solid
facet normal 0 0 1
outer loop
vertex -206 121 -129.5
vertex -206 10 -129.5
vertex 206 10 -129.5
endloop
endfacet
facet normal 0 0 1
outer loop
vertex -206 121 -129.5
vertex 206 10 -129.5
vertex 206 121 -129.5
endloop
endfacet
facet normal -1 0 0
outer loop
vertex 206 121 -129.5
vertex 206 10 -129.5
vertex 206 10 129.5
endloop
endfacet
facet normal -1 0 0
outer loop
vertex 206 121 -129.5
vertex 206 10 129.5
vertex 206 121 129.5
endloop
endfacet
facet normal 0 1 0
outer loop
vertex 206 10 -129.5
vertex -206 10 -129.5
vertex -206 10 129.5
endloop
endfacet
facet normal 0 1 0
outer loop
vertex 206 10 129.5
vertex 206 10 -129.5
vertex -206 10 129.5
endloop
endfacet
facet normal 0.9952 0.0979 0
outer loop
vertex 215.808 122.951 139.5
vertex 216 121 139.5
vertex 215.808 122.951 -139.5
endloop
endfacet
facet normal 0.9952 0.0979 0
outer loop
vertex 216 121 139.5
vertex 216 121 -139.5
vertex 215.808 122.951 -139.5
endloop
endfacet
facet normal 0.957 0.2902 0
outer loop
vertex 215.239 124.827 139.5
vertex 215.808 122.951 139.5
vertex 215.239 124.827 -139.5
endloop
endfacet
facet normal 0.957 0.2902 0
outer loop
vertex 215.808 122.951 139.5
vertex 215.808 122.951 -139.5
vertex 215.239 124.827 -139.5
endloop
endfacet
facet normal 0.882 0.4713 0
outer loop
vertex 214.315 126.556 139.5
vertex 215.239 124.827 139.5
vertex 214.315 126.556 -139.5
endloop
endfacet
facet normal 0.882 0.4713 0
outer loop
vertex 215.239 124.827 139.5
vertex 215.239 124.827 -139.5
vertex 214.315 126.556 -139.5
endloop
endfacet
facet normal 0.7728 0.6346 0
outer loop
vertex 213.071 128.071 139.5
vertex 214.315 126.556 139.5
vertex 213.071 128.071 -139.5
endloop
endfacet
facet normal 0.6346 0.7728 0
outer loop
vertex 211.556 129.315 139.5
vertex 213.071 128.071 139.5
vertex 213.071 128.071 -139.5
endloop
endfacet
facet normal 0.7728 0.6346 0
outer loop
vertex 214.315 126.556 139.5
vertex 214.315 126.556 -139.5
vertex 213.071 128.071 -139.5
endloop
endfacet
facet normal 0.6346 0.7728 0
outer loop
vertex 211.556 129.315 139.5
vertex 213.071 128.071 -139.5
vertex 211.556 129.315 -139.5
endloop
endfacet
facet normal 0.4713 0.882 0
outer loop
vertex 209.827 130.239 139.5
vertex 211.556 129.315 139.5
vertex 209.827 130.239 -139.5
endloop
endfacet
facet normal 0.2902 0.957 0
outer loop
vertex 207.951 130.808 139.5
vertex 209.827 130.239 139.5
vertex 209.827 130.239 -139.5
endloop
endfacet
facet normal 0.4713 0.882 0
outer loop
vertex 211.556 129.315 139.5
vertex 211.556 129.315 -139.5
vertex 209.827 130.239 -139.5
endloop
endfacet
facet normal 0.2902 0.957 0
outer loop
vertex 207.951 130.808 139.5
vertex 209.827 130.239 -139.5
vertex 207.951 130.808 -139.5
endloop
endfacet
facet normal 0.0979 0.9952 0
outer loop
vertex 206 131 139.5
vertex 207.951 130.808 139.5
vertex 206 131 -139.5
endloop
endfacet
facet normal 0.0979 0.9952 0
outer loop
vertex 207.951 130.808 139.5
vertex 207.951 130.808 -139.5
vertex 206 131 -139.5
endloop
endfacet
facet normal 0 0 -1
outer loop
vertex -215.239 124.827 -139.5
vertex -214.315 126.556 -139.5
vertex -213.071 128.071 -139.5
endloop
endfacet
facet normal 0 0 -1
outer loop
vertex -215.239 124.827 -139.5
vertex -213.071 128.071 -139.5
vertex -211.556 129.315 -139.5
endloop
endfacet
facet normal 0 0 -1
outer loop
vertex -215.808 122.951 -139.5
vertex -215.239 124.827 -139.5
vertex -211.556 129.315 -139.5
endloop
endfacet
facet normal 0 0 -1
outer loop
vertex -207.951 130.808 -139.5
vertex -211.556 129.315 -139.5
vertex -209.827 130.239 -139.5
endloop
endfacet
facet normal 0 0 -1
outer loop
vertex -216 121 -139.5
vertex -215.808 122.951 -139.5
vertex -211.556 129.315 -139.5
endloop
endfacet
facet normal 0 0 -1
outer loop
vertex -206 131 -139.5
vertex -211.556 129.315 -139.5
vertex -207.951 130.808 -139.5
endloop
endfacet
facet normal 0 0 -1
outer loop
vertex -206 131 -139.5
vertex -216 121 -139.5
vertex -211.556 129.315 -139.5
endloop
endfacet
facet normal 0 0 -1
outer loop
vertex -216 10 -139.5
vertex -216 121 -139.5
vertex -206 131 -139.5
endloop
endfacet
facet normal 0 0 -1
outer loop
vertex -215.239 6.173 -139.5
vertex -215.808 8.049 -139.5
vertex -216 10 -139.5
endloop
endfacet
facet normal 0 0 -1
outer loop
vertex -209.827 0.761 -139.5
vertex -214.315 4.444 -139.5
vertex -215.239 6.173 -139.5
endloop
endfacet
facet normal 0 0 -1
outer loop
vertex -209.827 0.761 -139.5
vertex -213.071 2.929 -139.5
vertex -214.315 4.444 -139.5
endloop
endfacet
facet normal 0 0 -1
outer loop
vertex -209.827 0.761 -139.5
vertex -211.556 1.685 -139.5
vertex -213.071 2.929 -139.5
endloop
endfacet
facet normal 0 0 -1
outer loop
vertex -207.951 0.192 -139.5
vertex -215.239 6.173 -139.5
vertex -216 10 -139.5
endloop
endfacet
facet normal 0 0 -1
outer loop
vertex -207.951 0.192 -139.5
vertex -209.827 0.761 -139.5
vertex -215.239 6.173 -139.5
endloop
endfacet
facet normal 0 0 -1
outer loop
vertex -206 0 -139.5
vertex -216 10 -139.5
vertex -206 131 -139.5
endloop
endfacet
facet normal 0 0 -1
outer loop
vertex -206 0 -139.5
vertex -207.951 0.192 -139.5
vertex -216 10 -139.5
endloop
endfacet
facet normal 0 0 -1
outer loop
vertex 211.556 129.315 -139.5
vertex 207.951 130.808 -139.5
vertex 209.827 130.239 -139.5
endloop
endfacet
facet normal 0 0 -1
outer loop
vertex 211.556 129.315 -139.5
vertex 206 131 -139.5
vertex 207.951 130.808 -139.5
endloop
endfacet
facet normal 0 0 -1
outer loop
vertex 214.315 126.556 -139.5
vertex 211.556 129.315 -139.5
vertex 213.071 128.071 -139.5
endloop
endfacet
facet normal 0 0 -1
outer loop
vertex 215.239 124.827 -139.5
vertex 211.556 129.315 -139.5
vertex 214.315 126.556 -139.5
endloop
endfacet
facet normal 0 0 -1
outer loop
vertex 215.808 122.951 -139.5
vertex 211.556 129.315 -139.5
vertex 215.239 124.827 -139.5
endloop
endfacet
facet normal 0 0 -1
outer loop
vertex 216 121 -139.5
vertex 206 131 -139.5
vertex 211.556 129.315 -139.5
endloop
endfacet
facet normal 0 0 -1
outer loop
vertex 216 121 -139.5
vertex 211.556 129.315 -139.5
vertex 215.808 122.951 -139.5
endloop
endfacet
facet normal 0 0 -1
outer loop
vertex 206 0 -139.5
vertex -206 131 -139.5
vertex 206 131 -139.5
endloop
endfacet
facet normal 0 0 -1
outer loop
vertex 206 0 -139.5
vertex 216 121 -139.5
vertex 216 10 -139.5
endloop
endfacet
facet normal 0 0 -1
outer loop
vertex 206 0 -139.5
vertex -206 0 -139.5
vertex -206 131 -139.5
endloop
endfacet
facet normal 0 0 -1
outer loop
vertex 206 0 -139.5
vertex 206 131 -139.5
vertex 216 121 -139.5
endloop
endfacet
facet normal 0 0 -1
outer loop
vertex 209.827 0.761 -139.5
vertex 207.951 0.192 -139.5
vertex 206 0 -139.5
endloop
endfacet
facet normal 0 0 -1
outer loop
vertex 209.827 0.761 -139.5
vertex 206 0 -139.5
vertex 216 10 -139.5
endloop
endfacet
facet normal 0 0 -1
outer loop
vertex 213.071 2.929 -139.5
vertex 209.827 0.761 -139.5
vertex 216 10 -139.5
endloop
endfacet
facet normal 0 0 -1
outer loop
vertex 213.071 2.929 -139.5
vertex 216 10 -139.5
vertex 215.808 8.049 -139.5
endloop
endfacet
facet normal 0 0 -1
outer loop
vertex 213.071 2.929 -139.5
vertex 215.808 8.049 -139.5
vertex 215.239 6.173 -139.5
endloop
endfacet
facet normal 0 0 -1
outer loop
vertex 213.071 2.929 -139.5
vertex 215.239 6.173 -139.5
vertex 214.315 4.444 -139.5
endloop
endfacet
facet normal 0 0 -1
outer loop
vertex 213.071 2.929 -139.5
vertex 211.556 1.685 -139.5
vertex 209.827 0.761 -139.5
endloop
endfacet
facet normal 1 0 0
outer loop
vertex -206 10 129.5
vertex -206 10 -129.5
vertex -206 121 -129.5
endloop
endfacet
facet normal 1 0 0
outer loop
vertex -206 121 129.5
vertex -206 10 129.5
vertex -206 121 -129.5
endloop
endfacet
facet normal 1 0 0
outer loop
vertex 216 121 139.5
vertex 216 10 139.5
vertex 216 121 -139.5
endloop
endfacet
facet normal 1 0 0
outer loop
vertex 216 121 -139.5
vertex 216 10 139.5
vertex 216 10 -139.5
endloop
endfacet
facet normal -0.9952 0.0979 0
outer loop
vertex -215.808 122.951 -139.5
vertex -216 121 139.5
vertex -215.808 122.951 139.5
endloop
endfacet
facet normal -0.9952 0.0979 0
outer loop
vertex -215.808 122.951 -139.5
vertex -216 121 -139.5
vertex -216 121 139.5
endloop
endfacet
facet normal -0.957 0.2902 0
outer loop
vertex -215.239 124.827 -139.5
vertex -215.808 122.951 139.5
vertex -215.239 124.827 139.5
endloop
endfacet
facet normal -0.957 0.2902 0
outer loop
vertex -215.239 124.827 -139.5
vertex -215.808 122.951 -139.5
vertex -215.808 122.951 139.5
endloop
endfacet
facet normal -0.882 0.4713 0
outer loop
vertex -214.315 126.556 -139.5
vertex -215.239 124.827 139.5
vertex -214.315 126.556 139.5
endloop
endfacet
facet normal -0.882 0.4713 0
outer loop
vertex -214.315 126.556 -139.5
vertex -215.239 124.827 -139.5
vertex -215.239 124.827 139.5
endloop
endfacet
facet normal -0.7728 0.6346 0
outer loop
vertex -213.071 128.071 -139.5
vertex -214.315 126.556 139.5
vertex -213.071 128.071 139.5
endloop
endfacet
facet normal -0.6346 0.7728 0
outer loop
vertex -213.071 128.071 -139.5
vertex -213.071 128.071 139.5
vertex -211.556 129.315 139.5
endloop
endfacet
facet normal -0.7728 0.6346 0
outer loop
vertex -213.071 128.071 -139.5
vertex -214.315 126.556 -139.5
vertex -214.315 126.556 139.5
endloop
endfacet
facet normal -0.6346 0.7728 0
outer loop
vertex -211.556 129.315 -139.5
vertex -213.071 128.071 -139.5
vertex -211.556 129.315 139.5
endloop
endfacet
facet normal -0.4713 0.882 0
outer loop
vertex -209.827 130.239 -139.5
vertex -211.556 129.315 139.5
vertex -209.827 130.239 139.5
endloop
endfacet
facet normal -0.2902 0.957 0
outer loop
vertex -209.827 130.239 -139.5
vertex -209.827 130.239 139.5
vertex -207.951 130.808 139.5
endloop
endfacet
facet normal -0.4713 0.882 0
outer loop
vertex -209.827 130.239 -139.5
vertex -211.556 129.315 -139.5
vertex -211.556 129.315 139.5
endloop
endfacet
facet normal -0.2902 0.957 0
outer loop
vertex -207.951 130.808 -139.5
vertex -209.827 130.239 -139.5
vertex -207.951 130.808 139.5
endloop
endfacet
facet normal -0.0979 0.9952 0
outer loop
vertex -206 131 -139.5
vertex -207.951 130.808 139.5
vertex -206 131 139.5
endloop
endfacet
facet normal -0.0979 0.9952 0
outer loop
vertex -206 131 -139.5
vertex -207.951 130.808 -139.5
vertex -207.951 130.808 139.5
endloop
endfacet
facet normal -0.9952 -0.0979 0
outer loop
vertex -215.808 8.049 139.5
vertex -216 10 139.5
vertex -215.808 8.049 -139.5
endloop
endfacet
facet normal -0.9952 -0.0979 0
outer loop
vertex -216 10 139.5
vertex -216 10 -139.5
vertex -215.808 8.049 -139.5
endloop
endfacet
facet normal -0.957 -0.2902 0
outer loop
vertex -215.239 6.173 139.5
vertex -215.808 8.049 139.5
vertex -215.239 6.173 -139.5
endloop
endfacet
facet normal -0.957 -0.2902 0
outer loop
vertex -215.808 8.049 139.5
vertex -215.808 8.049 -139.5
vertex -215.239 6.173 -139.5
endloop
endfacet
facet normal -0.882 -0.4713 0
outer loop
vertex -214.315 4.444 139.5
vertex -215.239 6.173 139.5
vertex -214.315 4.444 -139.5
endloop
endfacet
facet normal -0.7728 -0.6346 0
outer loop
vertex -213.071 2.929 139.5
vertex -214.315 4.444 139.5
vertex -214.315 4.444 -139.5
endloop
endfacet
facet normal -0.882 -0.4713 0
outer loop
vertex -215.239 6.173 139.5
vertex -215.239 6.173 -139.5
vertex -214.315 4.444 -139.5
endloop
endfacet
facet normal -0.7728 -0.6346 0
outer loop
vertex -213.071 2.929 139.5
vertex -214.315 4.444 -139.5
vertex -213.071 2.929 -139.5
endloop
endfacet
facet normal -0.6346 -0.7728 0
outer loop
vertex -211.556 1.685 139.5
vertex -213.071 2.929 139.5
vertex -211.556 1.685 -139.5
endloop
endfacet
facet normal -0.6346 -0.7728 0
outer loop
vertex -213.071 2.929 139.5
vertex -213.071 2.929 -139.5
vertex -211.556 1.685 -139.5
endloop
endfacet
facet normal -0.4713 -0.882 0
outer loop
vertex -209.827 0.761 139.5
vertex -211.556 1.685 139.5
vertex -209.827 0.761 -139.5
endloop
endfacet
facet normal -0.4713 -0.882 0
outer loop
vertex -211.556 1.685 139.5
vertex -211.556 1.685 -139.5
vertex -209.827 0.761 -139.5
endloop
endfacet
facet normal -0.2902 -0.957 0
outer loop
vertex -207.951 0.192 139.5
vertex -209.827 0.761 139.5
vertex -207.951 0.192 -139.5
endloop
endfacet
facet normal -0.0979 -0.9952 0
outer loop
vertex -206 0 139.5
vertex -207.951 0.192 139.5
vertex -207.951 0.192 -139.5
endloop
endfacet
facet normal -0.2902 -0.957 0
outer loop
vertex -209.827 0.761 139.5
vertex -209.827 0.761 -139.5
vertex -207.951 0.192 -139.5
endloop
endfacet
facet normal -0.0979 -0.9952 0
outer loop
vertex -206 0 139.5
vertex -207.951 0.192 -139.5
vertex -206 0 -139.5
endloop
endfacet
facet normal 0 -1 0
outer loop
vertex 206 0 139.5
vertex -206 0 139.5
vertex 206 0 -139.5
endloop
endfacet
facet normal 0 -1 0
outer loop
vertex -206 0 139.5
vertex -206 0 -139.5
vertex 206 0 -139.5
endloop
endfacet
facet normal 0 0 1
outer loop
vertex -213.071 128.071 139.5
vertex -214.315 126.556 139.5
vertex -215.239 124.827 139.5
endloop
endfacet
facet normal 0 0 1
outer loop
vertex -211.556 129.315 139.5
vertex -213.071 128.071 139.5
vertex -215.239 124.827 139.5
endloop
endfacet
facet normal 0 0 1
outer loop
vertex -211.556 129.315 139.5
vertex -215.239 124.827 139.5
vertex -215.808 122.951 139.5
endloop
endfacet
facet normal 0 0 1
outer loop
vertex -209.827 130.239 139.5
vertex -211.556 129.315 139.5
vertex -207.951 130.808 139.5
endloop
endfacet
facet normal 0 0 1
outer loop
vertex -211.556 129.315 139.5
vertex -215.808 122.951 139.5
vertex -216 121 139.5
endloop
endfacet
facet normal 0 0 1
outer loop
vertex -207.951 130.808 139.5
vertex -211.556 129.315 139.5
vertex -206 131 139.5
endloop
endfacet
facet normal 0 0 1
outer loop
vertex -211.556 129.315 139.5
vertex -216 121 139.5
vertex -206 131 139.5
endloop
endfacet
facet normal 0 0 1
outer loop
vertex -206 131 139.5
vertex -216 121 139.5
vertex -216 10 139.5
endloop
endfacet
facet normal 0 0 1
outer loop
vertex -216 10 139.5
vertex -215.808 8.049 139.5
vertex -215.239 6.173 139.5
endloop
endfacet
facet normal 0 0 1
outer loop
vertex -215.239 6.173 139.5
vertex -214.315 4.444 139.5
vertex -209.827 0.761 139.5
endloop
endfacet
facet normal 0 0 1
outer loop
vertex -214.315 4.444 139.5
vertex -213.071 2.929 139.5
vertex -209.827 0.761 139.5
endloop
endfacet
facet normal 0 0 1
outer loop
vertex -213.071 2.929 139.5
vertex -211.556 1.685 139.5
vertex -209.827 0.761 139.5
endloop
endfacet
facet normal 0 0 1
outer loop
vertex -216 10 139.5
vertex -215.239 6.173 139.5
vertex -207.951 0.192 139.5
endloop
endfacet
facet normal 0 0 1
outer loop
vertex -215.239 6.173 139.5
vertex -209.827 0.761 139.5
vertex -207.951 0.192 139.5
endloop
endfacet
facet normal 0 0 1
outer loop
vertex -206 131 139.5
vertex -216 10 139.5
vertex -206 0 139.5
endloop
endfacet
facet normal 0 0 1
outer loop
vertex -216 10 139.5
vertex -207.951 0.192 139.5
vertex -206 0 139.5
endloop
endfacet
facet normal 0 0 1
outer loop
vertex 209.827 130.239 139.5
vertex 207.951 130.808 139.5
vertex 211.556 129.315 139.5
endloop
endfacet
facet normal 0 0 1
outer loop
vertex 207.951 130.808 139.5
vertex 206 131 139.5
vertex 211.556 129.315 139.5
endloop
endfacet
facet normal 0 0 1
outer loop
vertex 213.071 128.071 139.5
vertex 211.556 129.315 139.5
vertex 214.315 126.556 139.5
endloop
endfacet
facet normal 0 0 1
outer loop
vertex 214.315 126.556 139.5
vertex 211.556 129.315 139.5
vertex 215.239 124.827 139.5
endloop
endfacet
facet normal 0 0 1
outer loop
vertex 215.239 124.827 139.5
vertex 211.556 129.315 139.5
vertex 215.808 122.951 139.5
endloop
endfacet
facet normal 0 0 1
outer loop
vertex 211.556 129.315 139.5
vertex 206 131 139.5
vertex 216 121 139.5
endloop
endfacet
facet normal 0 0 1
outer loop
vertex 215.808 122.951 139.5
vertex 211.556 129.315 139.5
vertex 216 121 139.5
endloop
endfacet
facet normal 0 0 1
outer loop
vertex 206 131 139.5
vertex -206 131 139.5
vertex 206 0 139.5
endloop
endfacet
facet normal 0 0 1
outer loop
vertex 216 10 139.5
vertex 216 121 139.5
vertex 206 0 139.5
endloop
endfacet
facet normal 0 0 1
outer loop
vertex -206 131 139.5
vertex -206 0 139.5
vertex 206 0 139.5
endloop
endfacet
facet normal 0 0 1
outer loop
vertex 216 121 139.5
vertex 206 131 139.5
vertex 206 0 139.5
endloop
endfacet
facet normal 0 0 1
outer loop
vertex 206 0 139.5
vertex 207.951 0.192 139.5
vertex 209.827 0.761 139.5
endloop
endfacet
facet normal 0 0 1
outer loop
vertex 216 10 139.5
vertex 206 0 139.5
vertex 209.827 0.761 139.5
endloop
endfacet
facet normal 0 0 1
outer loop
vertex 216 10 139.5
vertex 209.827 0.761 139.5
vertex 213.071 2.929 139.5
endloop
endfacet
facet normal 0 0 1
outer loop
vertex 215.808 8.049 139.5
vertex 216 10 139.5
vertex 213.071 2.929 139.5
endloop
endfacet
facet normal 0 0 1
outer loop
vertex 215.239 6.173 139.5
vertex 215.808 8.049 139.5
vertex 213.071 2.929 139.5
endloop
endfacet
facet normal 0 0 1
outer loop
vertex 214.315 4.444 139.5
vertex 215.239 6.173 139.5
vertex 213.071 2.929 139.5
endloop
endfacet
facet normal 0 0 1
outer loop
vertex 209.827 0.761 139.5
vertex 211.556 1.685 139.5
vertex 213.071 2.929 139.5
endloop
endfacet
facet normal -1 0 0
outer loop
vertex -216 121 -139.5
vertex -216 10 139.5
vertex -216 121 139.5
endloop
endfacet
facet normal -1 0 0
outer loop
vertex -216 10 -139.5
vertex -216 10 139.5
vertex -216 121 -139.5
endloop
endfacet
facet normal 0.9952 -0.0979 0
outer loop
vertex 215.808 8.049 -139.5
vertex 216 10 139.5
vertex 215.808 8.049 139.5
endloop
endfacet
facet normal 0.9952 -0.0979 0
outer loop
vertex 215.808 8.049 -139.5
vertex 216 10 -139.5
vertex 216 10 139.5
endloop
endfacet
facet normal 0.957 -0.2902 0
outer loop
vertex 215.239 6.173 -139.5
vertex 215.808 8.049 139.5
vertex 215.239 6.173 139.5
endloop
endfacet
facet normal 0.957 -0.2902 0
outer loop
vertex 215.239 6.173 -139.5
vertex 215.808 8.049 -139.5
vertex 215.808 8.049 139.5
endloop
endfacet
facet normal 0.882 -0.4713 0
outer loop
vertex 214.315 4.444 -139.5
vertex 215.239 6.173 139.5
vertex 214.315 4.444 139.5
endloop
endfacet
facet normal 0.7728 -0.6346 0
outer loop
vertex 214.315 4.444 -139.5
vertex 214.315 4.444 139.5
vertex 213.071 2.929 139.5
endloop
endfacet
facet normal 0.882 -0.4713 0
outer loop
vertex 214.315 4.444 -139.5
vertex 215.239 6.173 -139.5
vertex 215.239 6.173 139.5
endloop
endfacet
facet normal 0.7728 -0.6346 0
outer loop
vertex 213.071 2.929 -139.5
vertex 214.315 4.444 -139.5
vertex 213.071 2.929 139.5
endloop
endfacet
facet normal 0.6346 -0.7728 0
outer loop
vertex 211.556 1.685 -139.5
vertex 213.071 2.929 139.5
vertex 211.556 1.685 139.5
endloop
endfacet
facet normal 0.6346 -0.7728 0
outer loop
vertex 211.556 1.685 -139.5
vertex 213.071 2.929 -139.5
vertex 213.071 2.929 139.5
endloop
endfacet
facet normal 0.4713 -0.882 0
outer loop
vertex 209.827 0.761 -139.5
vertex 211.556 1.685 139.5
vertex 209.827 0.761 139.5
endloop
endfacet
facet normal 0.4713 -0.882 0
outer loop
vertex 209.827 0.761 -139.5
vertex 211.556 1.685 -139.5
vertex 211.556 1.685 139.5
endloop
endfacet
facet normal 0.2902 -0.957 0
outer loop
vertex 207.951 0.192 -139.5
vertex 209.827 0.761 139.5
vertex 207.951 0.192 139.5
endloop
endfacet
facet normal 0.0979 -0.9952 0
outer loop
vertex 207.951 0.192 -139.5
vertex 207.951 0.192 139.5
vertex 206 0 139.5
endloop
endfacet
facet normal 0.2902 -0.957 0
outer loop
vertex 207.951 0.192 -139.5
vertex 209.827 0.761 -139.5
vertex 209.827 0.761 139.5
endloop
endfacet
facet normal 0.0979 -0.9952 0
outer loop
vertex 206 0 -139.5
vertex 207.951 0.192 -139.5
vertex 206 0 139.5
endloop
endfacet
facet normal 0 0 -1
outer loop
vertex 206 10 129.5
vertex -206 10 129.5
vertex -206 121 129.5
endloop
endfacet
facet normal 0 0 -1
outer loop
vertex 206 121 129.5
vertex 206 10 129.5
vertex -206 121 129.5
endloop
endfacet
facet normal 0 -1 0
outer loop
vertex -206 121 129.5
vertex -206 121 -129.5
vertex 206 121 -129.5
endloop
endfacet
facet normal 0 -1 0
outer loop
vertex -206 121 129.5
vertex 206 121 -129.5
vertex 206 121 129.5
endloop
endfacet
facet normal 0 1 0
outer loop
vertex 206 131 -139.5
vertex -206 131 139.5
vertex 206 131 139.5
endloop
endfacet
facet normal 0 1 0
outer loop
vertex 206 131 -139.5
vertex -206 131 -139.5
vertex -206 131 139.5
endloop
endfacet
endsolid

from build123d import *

# Parameters (mm, degrees)
ESQUISSE1_W        = 432
ESQUISSE1_H        = 279
BOSS_EXTRU_1_DEPTH = 131
CONG_1_R           = 10
COQUE1_START       = -206
COQUE1_OUTLINE_W   = 111
COQUE1_OUTLINE_H   = 259
COQUE1_DEPTH       = 412


# Read off the part's stored shape, not the designer's step: Coque1
with BuildPart() as part:
    # Esquisse1 → Boss.-Extru.1 (new body)
    with BuildSketch(Plane(origin=(0, 0, 0), x_dir=(1, 0, 0), z_dir=(0, 1, 0))):
        Rectangle(ESQUISSE1_W, ESQUISSE1_H)
    extrude(amount=BOSS_EXTRU_1_DEPTH)

    # Congé1
    cong_1_edges = [part.edges().sort_by_distance(p)[0] for p in [
        (-216, 131, 0),
        (216, 131, 0),
        (-216, 0, 0),
        (216, 0, 0),
    ]]
    fillet(cong_1_edges, radius=CONG_1_R)

    # Coque1 outline → Coque1 (cut)
    with BuildSketch(Plane.YZ.offset(COQUE1_START)):
        with Locations((65.5, 0)):
            Rectangle(COQUE1_OUTLINE_W, COQUE1_OUTLINE_H)
    extrude(amount=COQUE1_DEPTH, mode=Mode.SUBTRACT)


solid = part.part
